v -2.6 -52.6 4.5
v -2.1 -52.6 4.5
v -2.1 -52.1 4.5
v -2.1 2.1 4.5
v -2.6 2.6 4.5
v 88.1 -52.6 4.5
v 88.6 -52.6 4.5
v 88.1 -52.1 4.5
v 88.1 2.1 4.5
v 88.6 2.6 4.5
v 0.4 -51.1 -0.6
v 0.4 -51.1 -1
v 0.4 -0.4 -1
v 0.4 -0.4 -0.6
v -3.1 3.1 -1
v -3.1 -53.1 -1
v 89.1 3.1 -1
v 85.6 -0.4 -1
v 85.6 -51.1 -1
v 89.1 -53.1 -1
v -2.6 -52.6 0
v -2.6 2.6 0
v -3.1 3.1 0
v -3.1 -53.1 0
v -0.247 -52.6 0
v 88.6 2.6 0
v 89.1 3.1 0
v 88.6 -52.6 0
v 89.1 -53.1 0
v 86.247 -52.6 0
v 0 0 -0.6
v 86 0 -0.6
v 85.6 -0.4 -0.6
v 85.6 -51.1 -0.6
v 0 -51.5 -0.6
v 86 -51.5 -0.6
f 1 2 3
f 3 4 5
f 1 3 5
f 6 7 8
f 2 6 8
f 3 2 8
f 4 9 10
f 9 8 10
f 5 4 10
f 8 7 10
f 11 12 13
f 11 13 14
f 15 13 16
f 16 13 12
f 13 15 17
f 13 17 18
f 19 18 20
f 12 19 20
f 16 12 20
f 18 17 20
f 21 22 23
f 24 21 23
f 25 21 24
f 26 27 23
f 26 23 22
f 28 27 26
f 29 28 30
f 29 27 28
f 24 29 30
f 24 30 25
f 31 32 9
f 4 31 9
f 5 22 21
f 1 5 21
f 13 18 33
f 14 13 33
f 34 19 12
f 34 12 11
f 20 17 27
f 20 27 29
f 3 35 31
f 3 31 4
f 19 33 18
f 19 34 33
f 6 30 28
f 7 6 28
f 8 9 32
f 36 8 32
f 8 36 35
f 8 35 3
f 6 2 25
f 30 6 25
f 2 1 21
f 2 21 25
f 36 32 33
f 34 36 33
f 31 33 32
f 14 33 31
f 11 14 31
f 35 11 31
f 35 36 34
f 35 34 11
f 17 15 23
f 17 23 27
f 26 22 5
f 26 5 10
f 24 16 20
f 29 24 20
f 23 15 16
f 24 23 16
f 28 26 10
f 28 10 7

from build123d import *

# Parameters (mm, degrees)
PAD005_DEPTH           = 100
PAD005_DEPTH_BACK      = 10
PAD004_DEPTH           = 60
PAD004_DEPTH_BACK      = 10
BOX_W                  = 55.2
BOX_H                  = 91.2
BOX_DEPTH              = 5.5
BOX_PLACEMENT_ANGLE    = -90
BOX001_W               = 56.2
BOX001_H               = 92.2
BOX001_DEPTH           = 1
BOX001_PLACEMENT_ANGLE = -90


with BuildPart() as pad_bezel_top_bottom:
    # Sketch006 → Pad005 (new body, two sides)
    with BuildSketch(Plane.YZ) as pad005_sk:
        Polygon((3.1, -1), (-0.4, -1), (-0.4, -0.6), (0, -0.6), (2.1, 4.5), (2.6, 4.5), (2.6, 0), (3.1, 0), align=None)
        Polygon((-51.5, -0.6), (-52.099998, 4.5), (-52.599998, 4.5), (-52.599998, 0), (-53.1, 0), (-53.1, -1), (-51.1, -1), (-51.1, -0.6), align=None)
    extrude(amount=PAD005_DEPTH)
    extrude(pad005_sk.sketch, amount=-PAD005_DEPTH_BACK)


with BuildPart() as fusion:
    # Sketch005 → Pad004 (new body, two sides)
    with BuildSketch(Plane.XZ) as pad004_sk:
        Polygon((-3.1, -1), (0.4, -1), (0.4, -0.6), (0, -0.6), (-2.1, 4.5), (-2.6, 4.5), (-2.6, 0), (-3.1, 0), align=None)
        Polygon((85.6, -1), (89.1, -1), (89.1, 0), (88.6, 0), (88.6, 4.5), (88.1, 4.5), (86, -0.6), (85.6, -0.6), align=None)
    extrude(amount=PAD004_DEPTH)
    extrude(pad004_sk.sketch, amount=-PAD004_DEPTH_BACK)

    # Fusion: union Pad (bezel top/bottom)
    add(pad_bezel_top_bottom.part)


with BuildPart() as cube_bezel_main:
    # Box → Box (new body)
    with BuildSketch(Plane.XY):
        with Locations((27.6, 45.6)):
            Rectangle(BOX_W, BOX_H)
    extrude(amount=BOX_DEPTH)


with BuildPart() as cube_bezel_main_1:
    # Box placement: moved
    add(cube_bezel_main.part.moved(Location((-2.6, 2.6, 0))).rotate(Axis((-2.6, 2.6, 0), (0, 0, 1)), BOX_PLACEMENT_ANGLE))


with BuildPart() as common_bezel:
    # Box001 → Box001 (new body)
    with BuildSketch(Plane.XY):
        with Locations((28.1, 46.1)):
            Rectangle(BOX001_W, BOX001_H)
    extrude(amount=BOX001_DEPTH)


with BuildPart() as common_bezel_1:
    # Box001 placement: moved
    add(common_bezel.part.moved(Location((-3.1, 3.1, -1))).rotate(Axis((-3.1, 3.1, -1), (0, 0, 1)), BOX001_PLACEMENT_ANGLE))

    # Fusion001: union Cube (bezel main)
    add(cube_bezel_main_1.part)

    # Common: intersect Fusion
    add(fusion.part, mode=Mode.INTERSECT)


solid = common_bezel_1.part
